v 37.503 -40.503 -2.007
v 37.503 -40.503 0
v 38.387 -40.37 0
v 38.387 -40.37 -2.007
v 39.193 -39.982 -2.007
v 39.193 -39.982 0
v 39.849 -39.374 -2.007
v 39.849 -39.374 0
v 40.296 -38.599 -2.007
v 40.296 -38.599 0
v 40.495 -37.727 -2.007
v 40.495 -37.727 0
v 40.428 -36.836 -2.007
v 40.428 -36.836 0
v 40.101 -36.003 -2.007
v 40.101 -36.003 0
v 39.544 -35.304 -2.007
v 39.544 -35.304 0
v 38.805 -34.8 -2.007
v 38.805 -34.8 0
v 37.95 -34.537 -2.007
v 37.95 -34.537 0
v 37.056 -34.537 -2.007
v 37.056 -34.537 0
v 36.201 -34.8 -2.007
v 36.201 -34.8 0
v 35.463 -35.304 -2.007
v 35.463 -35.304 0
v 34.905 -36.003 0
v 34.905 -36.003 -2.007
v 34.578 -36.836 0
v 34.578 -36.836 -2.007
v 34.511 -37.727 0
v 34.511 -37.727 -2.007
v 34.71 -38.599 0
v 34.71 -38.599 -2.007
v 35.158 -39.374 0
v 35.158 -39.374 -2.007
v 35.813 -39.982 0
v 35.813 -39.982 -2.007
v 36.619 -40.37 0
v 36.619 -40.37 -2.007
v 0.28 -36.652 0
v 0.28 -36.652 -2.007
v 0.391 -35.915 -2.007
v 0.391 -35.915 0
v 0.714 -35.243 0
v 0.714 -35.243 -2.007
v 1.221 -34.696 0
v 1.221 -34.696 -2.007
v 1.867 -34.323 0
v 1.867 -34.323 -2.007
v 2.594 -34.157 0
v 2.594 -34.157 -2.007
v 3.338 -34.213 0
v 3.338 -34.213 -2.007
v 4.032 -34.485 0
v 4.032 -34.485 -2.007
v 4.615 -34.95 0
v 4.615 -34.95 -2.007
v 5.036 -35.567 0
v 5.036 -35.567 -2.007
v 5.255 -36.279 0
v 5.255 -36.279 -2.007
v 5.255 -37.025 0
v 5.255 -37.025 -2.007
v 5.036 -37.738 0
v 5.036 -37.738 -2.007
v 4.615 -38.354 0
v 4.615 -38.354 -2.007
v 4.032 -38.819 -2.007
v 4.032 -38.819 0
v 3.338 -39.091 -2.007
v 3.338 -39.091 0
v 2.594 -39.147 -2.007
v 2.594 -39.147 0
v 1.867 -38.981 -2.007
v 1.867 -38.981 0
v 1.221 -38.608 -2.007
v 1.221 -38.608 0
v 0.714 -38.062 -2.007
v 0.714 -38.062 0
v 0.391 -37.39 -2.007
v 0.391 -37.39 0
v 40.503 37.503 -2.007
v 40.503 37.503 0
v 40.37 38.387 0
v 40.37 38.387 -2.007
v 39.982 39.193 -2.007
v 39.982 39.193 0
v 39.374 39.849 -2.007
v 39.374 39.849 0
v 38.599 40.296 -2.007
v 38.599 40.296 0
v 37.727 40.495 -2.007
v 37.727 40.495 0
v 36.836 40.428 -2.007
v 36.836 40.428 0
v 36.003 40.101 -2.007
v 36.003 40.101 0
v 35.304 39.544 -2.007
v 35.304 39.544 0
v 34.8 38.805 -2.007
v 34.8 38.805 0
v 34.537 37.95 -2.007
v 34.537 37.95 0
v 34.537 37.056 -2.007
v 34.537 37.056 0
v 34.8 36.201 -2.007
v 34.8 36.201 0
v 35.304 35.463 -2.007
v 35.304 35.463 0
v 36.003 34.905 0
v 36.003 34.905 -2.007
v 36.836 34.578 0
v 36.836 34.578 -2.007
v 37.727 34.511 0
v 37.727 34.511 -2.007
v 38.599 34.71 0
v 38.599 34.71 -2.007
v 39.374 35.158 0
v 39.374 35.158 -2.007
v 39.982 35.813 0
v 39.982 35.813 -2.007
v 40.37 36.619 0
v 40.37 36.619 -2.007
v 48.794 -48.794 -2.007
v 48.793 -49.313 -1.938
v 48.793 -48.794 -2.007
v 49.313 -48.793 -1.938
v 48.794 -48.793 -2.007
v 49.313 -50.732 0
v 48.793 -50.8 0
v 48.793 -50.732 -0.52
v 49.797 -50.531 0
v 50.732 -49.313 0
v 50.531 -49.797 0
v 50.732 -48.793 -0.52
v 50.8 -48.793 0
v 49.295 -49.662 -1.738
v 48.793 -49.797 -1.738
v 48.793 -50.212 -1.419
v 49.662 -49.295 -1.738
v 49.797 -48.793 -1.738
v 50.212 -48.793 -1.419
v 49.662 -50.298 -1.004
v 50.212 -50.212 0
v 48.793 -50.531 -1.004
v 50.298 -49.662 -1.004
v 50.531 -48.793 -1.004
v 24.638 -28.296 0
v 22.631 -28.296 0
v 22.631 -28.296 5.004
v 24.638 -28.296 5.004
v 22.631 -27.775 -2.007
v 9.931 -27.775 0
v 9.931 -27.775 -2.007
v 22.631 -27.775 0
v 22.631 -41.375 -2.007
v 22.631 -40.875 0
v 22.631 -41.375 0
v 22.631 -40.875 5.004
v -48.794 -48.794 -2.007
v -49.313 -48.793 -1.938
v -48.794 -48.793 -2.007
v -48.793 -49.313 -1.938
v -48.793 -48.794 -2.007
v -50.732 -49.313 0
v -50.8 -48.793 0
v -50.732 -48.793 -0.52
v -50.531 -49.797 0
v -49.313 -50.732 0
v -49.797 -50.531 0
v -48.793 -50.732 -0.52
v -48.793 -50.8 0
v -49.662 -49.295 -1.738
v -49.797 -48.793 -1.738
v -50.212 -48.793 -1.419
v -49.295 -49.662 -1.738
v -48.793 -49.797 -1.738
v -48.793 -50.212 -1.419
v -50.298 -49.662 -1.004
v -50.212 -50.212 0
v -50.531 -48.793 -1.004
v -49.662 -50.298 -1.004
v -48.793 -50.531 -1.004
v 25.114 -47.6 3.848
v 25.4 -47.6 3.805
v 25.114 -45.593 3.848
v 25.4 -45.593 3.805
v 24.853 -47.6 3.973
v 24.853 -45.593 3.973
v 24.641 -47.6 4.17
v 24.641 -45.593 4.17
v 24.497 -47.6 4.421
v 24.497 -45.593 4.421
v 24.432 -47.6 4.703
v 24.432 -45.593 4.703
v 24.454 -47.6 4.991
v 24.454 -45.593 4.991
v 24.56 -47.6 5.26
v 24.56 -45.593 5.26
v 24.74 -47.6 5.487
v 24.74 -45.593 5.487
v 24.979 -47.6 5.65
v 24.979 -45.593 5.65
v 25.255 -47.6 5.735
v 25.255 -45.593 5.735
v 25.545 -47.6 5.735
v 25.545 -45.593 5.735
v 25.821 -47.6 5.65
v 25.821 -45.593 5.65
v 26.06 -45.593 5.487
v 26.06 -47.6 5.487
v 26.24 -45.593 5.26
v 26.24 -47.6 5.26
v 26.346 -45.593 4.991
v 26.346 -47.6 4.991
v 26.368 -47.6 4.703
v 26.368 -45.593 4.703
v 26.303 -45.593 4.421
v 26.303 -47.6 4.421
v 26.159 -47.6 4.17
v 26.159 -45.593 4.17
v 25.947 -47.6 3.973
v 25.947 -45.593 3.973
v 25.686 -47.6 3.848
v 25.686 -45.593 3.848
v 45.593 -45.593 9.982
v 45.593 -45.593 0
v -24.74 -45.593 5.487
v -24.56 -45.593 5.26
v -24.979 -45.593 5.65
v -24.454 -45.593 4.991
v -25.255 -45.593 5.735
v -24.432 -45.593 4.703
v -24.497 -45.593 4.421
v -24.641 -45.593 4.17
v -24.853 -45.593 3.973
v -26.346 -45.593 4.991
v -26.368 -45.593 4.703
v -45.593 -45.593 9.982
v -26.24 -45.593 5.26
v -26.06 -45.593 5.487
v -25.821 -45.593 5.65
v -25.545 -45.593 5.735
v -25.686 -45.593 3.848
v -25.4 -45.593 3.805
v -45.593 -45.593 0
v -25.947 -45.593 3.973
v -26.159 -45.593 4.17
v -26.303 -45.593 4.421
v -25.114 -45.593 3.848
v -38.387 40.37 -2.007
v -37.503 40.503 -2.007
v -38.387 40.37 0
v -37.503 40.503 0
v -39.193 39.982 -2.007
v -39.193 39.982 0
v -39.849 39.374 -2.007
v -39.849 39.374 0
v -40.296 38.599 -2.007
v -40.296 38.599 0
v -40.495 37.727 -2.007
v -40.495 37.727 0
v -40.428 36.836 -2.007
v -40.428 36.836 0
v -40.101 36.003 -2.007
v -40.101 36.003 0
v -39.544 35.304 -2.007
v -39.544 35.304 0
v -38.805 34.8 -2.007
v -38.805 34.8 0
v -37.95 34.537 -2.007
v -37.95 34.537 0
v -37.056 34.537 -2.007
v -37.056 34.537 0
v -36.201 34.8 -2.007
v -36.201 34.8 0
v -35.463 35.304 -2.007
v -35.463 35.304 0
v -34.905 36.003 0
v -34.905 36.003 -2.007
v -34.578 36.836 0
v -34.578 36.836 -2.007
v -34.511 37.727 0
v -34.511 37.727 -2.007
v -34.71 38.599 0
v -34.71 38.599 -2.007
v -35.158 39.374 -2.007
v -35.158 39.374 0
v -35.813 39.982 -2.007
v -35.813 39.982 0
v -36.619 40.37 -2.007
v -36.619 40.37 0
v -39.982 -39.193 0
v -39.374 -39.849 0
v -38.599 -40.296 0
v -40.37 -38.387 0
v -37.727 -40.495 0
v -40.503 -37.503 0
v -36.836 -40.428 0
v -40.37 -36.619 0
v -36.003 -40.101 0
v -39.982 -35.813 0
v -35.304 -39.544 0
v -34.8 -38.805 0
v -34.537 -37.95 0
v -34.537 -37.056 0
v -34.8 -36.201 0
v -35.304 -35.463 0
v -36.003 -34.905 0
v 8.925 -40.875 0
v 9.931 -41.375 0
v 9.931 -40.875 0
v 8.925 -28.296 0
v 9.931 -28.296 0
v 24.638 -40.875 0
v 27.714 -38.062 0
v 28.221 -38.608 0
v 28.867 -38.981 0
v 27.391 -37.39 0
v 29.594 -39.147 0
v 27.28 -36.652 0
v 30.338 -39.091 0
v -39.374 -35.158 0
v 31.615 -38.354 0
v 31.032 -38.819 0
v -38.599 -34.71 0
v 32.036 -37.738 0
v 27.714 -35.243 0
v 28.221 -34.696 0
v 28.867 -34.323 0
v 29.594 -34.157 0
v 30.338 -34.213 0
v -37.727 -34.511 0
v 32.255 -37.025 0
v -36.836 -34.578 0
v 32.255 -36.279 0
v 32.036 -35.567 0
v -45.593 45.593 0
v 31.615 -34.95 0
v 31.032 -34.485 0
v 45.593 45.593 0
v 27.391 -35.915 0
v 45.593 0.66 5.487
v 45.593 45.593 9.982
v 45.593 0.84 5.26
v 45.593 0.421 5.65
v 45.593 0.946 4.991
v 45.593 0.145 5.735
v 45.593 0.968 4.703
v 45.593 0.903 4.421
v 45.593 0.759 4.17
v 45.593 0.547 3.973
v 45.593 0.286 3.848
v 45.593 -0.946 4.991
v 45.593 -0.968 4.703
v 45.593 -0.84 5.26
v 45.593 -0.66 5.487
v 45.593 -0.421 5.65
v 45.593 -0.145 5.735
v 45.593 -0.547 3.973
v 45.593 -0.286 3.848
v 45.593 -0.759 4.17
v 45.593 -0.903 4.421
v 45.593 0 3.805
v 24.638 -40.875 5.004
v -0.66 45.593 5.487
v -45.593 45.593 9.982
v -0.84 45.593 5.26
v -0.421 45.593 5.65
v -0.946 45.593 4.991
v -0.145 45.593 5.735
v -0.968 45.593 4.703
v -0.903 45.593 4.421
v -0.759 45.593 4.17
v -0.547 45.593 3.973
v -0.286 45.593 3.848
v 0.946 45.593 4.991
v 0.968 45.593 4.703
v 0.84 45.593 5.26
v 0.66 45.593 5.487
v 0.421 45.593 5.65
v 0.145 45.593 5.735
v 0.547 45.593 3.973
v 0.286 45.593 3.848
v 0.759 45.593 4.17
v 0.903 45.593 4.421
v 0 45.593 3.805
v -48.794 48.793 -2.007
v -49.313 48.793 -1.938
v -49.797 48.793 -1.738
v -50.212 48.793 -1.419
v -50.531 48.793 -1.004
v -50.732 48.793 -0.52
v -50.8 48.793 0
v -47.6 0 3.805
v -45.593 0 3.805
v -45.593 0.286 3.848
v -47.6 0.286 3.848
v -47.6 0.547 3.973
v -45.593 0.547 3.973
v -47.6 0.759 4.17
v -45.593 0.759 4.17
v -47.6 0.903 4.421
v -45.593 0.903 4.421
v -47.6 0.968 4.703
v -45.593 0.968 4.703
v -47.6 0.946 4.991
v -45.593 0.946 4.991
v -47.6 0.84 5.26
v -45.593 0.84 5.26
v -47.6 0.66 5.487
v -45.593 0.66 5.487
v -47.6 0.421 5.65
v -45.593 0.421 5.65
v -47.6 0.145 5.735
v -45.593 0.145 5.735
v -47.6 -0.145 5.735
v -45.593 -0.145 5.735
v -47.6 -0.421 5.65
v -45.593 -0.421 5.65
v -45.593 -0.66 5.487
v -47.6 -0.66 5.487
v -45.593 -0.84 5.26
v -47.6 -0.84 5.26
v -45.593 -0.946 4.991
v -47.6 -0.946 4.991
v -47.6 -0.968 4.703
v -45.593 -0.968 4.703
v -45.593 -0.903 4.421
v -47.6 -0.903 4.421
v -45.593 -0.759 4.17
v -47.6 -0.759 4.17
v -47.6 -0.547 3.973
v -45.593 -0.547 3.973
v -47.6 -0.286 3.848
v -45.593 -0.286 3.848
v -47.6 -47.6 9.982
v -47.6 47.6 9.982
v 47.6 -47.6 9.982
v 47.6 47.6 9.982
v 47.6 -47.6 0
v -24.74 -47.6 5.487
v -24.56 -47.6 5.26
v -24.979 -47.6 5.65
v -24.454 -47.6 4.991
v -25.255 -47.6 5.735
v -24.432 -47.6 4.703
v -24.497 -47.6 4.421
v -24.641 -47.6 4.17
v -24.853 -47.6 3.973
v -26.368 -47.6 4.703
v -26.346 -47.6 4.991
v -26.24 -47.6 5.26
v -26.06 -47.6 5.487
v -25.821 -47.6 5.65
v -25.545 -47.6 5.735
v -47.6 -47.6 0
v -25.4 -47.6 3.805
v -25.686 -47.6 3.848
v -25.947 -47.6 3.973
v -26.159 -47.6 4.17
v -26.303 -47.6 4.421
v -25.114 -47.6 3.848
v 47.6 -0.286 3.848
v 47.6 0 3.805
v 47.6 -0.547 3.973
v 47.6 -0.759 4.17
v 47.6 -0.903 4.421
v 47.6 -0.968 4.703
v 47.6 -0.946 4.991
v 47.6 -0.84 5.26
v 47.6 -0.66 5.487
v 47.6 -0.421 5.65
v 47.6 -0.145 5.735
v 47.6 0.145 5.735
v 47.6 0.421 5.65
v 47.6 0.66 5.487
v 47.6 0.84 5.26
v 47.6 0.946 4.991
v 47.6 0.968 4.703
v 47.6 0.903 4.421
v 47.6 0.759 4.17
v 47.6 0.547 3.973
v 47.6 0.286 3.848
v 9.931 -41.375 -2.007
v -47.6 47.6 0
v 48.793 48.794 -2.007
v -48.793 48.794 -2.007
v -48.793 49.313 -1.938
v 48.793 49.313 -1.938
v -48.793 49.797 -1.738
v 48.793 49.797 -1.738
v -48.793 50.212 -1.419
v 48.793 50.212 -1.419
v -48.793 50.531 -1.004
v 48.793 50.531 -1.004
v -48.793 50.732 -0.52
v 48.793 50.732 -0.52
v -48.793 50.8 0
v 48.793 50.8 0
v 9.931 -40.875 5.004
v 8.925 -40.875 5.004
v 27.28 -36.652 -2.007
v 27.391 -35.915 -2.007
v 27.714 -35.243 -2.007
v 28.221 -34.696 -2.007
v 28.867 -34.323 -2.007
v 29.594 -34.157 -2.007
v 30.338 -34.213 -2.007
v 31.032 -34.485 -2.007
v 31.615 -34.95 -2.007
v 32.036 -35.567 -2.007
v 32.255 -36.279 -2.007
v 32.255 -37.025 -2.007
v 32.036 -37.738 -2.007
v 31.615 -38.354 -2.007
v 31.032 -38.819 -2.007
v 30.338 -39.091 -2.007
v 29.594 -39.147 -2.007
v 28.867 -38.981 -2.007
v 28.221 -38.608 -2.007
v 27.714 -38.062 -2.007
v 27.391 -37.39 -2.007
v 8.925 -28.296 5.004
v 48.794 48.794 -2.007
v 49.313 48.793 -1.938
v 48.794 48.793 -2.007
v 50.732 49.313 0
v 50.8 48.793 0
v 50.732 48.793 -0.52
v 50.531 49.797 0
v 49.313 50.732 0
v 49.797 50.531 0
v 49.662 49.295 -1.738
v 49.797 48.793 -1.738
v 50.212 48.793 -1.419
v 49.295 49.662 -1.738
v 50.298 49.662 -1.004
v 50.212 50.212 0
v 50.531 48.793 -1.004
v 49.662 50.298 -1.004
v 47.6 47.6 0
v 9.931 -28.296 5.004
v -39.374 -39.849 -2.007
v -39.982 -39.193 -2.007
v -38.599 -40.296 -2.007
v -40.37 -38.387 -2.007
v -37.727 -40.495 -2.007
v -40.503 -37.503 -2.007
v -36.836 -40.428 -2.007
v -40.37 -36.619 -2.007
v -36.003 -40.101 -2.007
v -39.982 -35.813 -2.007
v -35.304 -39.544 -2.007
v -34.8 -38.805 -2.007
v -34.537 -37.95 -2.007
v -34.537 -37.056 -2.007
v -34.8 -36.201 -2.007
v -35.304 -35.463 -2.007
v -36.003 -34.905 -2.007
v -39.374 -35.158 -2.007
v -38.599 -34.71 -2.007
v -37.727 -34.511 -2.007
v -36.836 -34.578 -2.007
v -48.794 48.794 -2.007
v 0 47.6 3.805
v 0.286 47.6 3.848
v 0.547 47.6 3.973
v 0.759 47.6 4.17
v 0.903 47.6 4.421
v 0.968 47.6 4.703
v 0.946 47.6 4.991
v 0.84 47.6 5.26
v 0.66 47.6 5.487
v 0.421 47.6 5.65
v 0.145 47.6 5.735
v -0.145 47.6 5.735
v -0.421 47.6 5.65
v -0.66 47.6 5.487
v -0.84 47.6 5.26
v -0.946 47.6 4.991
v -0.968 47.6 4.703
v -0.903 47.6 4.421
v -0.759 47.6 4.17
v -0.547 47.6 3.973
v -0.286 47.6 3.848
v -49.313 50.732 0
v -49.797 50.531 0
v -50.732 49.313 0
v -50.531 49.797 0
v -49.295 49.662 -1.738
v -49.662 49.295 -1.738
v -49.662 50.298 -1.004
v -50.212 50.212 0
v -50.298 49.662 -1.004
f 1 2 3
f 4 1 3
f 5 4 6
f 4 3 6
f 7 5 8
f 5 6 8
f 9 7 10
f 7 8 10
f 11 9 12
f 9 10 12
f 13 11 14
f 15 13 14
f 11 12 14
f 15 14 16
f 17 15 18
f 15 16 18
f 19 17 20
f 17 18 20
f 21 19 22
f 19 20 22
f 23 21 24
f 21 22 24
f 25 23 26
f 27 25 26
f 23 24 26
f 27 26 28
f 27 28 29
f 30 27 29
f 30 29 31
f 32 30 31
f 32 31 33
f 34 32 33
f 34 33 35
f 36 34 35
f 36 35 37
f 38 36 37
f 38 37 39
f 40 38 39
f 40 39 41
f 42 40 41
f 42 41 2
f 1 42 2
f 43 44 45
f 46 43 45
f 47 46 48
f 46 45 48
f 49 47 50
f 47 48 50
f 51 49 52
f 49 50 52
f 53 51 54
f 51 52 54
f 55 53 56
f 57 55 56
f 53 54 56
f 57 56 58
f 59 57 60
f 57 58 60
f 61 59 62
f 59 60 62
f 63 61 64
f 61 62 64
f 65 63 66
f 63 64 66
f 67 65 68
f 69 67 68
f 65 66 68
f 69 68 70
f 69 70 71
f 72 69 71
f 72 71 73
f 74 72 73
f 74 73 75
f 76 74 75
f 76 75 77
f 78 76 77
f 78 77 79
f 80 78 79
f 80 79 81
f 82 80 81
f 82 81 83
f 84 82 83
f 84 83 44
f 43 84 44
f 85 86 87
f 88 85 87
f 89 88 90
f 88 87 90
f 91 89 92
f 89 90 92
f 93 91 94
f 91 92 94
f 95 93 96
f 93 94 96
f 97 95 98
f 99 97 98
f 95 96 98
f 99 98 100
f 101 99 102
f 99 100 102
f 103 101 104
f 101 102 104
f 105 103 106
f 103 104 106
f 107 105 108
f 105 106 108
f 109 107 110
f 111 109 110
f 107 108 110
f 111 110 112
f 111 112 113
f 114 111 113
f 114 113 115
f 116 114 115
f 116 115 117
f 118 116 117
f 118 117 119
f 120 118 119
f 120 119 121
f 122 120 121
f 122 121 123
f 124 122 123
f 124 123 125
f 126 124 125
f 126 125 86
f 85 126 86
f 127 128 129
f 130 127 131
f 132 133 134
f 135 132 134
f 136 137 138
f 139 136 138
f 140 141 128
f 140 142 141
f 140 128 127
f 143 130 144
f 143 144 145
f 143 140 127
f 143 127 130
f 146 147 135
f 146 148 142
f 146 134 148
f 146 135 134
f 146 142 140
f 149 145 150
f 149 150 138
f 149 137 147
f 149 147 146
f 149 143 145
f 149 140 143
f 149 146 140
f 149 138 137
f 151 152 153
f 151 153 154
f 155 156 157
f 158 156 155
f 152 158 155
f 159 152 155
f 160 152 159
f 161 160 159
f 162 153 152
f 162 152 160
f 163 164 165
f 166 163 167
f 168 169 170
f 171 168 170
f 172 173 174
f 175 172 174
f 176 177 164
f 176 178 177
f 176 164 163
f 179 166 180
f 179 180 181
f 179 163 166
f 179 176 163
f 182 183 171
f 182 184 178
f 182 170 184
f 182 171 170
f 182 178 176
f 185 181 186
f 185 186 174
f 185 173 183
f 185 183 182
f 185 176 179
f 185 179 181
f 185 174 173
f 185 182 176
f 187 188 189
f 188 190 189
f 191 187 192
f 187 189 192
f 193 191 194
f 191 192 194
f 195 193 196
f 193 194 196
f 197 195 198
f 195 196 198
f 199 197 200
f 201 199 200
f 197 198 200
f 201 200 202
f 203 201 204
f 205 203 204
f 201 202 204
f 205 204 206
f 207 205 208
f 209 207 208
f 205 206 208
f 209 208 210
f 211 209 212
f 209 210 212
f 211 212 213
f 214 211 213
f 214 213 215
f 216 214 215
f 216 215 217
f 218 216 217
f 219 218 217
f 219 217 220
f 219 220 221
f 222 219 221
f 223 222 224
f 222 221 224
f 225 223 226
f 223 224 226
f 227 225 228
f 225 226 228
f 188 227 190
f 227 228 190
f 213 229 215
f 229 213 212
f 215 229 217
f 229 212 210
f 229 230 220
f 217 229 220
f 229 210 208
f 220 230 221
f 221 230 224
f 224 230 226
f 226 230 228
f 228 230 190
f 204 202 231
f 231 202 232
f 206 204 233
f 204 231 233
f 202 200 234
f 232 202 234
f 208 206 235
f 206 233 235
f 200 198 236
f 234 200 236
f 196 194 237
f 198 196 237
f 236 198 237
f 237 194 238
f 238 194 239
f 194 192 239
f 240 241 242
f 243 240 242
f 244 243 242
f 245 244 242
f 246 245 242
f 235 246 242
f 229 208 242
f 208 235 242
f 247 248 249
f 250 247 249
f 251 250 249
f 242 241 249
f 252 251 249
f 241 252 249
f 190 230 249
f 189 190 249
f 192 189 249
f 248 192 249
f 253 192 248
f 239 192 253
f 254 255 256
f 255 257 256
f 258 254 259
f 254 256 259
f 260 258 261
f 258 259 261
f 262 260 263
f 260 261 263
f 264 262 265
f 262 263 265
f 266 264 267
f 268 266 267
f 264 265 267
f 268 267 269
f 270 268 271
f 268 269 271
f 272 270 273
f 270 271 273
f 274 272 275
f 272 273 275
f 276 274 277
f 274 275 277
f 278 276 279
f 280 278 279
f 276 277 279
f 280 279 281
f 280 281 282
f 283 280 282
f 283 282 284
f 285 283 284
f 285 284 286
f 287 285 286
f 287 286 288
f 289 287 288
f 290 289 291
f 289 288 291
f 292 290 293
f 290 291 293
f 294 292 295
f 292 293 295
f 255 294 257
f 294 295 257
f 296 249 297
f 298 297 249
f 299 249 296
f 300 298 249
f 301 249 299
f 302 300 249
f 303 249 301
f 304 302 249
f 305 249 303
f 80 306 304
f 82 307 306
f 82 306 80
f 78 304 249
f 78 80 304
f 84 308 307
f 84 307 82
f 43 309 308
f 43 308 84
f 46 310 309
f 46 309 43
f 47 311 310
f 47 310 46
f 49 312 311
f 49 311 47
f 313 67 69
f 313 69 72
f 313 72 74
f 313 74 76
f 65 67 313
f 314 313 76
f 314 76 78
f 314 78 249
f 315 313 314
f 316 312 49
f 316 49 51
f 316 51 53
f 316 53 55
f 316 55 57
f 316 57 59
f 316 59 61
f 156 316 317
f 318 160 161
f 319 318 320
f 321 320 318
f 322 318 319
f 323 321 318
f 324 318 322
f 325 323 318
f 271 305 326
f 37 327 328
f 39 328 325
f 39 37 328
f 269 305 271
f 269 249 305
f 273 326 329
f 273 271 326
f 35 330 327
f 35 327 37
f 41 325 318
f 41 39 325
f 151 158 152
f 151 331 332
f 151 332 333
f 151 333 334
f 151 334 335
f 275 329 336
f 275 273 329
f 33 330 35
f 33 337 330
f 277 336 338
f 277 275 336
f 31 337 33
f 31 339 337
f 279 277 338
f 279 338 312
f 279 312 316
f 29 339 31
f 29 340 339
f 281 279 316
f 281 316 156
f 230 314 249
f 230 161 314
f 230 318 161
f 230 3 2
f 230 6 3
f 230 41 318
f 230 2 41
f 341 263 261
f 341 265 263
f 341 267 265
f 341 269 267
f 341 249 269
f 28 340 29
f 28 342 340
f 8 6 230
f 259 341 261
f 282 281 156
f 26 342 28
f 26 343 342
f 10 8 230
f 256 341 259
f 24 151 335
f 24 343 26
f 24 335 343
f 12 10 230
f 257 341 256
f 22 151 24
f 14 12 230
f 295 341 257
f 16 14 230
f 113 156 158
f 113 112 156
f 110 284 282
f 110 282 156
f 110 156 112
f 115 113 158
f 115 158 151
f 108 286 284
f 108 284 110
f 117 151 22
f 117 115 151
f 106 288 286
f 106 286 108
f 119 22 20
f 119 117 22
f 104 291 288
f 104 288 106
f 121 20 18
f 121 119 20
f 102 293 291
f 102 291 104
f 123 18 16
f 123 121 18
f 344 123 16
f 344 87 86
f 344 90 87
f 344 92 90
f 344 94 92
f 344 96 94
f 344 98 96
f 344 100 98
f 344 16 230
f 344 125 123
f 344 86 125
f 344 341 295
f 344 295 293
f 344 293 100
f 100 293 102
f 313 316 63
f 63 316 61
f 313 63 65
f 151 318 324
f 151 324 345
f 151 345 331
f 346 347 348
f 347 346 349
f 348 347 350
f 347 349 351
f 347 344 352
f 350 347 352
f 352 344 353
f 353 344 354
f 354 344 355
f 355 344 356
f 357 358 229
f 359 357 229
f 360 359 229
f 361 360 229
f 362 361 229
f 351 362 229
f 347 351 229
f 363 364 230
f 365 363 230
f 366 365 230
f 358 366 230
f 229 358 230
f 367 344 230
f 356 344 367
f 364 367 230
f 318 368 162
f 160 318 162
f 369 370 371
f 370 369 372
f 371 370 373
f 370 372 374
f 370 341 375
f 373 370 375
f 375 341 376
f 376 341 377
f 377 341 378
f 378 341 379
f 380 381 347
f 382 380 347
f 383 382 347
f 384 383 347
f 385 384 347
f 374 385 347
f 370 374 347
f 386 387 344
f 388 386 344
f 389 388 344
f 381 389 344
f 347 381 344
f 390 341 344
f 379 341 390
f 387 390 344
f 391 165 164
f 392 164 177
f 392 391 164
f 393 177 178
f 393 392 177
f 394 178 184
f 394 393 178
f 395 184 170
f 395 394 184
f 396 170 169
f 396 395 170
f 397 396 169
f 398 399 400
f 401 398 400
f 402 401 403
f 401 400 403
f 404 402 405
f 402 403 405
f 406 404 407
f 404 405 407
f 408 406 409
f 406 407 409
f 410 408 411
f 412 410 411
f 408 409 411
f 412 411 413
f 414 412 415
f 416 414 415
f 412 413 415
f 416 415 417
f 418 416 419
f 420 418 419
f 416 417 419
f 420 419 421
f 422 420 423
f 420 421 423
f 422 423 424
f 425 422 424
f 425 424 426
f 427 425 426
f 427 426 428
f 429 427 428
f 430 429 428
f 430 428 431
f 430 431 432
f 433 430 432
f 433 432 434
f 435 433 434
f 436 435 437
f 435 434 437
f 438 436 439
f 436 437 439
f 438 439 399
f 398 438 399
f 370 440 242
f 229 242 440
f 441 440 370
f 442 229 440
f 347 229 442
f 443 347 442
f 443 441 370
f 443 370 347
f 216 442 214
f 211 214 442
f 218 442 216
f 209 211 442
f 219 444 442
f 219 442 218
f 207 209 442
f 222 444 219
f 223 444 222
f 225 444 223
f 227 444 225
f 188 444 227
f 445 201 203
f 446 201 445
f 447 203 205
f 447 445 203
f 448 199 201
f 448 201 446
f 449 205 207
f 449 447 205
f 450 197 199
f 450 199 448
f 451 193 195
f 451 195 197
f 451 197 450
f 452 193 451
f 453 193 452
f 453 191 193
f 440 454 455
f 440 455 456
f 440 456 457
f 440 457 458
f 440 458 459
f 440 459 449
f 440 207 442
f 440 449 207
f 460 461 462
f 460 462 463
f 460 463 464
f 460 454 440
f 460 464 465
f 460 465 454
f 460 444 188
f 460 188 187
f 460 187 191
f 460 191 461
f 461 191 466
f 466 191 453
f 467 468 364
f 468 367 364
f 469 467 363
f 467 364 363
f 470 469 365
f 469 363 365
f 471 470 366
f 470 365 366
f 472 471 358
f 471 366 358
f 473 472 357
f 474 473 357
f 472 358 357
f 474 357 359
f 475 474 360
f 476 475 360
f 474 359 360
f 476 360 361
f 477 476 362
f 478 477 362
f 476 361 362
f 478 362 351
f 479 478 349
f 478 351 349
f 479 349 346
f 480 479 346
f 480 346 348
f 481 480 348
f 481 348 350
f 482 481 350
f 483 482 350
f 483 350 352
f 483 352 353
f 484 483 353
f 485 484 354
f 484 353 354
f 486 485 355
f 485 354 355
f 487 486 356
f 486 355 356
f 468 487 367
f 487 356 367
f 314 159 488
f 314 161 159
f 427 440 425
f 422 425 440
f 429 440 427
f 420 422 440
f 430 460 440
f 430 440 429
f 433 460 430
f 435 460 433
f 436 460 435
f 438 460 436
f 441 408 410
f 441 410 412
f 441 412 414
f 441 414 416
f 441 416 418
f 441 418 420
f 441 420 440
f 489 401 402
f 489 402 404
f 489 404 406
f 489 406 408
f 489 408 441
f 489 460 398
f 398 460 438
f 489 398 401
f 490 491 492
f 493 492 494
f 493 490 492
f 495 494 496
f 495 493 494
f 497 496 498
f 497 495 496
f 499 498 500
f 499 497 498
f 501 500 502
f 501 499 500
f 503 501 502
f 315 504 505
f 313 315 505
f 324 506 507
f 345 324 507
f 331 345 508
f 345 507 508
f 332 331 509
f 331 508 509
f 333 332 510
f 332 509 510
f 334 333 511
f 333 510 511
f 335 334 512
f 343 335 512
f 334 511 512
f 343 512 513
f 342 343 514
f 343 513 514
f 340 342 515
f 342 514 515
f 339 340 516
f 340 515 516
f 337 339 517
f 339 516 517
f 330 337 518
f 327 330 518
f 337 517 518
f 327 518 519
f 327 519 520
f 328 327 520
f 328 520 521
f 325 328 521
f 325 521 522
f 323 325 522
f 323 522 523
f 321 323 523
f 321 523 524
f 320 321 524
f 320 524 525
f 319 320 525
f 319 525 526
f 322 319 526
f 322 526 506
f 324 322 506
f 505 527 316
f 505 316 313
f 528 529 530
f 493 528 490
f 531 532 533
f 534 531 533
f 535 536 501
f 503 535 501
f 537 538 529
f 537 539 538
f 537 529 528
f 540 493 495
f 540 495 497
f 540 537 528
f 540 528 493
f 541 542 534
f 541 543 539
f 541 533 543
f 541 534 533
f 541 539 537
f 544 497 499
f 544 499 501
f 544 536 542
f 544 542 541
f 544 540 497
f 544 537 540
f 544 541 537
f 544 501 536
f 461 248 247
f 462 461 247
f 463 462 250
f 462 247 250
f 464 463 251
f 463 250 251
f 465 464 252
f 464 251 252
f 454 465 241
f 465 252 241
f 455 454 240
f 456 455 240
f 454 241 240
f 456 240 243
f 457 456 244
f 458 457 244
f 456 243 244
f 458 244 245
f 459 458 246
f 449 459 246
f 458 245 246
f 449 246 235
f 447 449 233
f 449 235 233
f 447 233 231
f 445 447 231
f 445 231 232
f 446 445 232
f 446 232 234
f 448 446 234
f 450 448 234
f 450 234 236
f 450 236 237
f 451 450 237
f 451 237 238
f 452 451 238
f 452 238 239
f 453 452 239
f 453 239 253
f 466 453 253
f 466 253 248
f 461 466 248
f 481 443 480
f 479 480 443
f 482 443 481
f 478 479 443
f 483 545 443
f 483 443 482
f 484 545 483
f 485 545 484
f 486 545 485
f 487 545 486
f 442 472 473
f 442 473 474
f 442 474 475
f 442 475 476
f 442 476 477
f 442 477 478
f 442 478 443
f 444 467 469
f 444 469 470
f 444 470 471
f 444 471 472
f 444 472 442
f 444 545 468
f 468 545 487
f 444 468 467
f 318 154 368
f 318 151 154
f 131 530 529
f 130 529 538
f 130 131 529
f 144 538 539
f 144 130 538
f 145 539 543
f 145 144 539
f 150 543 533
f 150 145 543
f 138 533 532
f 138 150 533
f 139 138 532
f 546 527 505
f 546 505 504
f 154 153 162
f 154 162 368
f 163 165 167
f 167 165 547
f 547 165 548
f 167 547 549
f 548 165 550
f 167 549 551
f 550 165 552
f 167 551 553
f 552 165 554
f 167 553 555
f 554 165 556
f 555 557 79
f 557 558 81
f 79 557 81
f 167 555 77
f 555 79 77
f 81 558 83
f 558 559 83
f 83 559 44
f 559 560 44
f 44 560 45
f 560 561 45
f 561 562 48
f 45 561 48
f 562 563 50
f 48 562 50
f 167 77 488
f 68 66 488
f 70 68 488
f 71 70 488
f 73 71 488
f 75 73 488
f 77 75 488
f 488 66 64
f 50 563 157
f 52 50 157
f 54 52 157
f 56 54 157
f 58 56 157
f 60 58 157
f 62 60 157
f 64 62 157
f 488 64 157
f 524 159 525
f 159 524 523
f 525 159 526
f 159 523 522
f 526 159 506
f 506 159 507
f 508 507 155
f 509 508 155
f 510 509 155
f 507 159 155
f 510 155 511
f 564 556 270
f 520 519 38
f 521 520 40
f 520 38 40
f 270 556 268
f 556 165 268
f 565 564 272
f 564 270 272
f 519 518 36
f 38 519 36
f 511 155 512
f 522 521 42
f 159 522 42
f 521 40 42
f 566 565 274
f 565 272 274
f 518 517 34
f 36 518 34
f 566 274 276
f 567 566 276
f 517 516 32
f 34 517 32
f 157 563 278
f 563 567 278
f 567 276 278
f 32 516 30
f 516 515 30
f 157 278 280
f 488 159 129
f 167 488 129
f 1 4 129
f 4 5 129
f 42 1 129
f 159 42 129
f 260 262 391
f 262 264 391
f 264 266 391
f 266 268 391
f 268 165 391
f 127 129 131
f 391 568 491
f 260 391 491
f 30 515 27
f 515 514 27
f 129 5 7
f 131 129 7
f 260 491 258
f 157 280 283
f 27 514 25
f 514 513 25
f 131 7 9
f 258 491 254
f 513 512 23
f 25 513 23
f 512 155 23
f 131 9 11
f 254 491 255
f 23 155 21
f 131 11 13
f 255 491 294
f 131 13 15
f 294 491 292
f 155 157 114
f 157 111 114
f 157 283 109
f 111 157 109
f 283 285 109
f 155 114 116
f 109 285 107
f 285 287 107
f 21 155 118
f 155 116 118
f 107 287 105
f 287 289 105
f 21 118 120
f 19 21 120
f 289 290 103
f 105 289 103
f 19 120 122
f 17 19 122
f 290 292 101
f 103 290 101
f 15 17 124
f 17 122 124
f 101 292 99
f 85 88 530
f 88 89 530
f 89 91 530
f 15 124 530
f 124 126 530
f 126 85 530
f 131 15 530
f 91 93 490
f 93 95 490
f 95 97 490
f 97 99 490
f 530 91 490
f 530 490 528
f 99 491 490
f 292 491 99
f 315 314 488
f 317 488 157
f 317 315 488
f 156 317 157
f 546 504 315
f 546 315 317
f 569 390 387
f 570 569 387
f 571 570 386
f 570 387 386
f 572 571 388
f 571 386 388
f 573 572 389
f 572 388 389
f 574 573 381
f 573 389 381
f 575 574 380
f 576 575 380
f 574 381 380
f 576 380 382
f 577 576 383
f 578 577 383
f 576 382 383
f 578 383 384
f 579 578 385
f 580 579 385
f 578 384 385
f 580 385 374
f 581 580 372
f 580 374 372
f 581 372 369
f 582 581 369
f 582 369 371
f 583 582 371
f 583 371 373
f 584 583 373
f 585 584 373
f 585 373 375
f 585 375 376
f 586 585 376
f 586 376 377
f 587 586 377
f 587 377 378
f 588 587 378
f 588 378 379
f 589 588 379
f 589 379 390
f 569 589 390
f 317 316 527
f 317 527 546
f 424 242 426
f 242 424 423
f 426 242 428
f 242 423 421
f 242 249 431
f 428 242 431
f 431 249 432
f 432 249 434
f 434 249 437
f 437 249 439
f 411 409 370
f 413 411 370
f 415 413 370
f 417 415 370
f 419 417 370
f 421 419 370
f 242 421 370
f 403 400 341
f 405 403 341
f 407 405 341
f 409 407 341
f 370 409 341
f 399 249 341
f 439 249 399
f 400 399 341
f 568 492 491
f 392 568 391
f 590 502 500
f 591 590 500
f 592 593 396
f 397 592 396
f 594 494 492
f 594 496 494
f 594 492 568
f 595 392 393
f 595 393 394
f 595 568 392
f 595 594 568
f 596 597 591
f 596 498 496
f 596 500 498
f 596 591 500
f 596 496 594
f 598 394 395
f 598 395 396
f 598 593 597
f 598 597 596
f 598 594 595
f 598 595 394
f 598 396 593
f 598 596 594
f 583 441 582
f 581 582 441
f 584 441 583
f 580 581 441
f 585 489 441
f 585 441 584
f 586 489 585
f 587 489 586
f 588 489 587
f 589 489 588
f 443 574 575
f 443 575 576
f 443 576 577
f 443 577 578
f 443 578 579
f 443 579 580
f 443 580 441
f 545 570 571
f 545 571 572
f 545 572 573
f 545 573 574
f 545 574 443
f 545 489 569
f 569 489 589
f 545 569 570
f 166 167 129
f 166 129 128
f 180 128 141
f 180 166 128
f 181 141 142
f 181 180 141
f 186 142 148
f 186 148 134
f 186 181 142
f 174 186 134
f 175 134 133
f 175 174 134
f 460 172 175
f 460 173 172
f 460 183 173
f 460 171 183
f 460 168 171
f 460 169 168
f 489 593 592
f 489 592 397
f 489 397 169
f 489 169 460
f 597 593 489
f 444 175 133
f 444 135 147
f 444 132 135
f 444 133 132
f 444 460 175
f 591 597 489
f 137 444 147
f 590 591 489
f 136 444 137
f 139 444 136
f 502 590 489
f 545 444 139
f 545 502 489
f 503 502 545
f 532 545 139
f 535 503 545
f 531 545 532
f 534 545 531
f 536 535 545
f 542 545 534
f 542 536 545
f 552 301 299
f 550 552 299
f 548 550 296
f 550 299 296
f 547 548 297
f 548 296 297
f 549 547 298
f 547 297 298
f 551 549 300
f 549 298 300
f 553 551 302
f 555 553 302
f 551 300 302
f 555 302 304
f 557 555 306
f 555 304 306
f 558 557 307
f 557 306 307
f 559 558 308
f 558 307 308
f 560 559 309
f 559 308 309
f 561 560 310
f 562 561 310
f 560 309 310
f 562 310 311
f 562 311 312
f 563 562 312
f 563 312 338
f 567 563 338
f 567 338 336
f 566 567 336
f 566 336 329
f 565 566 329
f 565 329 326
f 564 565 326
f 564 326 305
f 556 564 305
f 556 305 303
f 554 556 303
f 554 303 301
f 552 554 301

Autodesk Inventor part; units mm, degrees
ref_plane "YZ Plane" through (0, 0, 0) normal (1, 0, 0) x (0, 1, 0)
ref_plane "XZ Plane" through (0, 0, 0) normal (0, 1, 0) x (-1, 0, 0)
ref_plane "XY Plane" through (0, 0, 0) normal (0, 0, 1) x (1, 0, 0)
sketch "Skizze1" plane through (0, 0, 0) normal (0, 0, 1) x (1, 0, 0)
  line L0 (-50.8, 50.8) -> (50.8, 50.8)
  line L1 (50.8, 50.8) -> (50.8, -50.8)
  line L2 (50.8, -50.8) -> (-50.8, -50.8)
  line L3 (-50.8, -50.8) -> (-50.8, 50.8)
  line L4 (50.8, -50.8) -> (-50.8, 50.8) construction
  point P0 (0, 0)
  point P1 (0, 0)
  dimension "d0" = 101.6
  dimension "d1" = 101.6
extrude "Extrusion1" add sketch "Skizze1" against normal blind 2.0066
fillet "Rundung1" radius 2.0066 4 edges at (50.8, -50.8, -1.0033) (50.8, 50.8, -1.0033) (-50.8, 50.8, -1.0033) (-50.8, -50.8, -1.0033)
fillet "Rundung2" radius 2.0066 8 edges at (-50.2123, -50.2123, -2.0066) (-50.8, 0, -2.0066) (-50.2123, 50.2123, -2.0066) (0, 50.8, -2.0066) (50.2123, 50.2123, -2.0066) (50.8, 0, -2.0066) (50.2123, -50.2123, -2.0066) (0, -50.8, -2.0066)
sketch "Skizze2" plane through (0, 0, 0) normal (0, 0, 1) x (1, 0, 0)
  line L0 (-47.5996, 47.5996) -> (47.5996, 47.5996)
  line L1 (47.5996, 47.5996) -> (47.5996, -47.5996)
  line L2 (47.5996, -47.5996) -> (-47.5996, -47.5996)
  line L3 (-47.5996, -47.5996) -> (-47.5996, 47.5996)
  line L4 (47.5996, -47.5996) -> (-47.5996, 47.5996) construction
  line L5 (-45.593, 45.593) -> (45.593, 45.593)
  line L6 (45.593, 45.593) -> (45.593, -45.593)
  line L7 (45.593, -45.593) -> (-45.593, -45.593)
  line L8 (-45.593, -45.593) -> (-45.593, 45.593)
  line L9 (-45.593, -45.593) -> (45.593, 45.593) construction
  point P0 (0, 0)
  point P1 (0, 0)
  dimension "d6" = 95.1992
  dimension "d7" = 2.0066
extrude "Extrusion2" add sketch "Skizze2" along normal blind 9.9822
sketch "Skizze3" plane through (47.5996, -47.5996, 0) normal (1, 0, 0) x (0, 0, -1)
  line L0 (0, 95.1992) -> (0, 0) projected
  line L1 (0, 95.1992) -> (-9.9822, 95.1992) projected
  line L2 (-9.9822, 0) -> (-9.9822, 95.1992) projected
  line L3 (0, 0) -> (-9.9822, 0) projected
  line L4 (0, 47.5996) -> (-4.7752, 47.5996) construction
  line L5 (0, 95.1992) -> (0, 0) construction
  dimension "d10" = 4.7752
hole "Bohrung1" at (47.5996, 0, 4.7752) direction (-1, 0, 0) diameter 1.941 depth 7.675 tip angle 118 thread size "3-48 UNC" class "2B" standard "ANSI Unified Screw Threads"
pattern_circular "Runde Anordnung1" count 3 over 180 about axis through (0, 0, -10) along (0, 0, 1) of "Bohrung1"
sketch "Skizze4" plane through (-47.5996, -47.5996, 0) normal (0, -1, 0) x (1, 0, 0)
  line L0 (95.1992, 0) -> (0, 0) projected
  line L1 (95.1992, 0) -> (95.1992, 9.9822) projected
  line L2 (0, 9.9822) -> (95.1992, 9.9822) projected
  line L3 (0, 0) -> (0, 9.9822) projected
  line L4 (47.5996, 0) -> (47.5996, 4.7752) construction
  line L5 (22.1996, 4.7752) -> (72.9996, 4.7752) construction
  dimension "d21" = 4.7752
  dimension "d22" = 50.8
hole "Bohrung2" at (-25.4, -47.5996, 4.7752) at (25.4, -47.5996, 4.7752) direction (0, 1, 0) diameter 1.941 depth 7.675 tip angle 118 thread size "3-48 UNC" class "2B" standard "ANSI Unified Screw Threads"
sketch "Skizze5" plane through (0, 0, -2.0066) normal (0, 0, -1) x (-1, 0, 0)
  line L0 (37.5031, -37.5031) -> (-37.5031, -37.5031) construction
  line L1 (-37.5031, -37.5031) -> (-37.5031, 37.5031) construction
  line L2 (-37.5031, 37.5031) -> (37.5031, 37.5031) construction
  line L3 (37.5031, 37.5031) -> (37.5031, -37.5031) construction
  line L4 (-37.5031, 37.5031) -> (37.5031, -37.5031) construction
  point P0 (0, 0)
  point P1 (0, 0)
  dimension "d30" = 75.0062
hole "Bohrung3" at (-37.5031, 37.5031, -2.0066) direction (0, 0, 1) diameter 6 end through all
sketch "Skizze6" plane through (0, 0, 0) normal (0, 0, 1) x (1, 0, 0)
  circle A0 centre (-37.5031, 37.5031) radius 3 projected
  line L0 (-48.7934, 48.7934) -> (-48.7934, -48.7934) projected
  line L1 (48.7934, 48.7934) -> (-48.7934, 48.7934) projected
  line L2 (48.7934, -48.7934) -> (48.7934, 48.7934) projected
  line L3 (-48.7934, -48.7934) -> (48.7934, -48.7934) projected
  circle A1 centre (-37.5031, 37.5031) radius 3.45
  circle A2 centre (-37.5031, 37.5031) radius 1.4986
  point P0 (0, 0)
  dimension "d38" = 2.9972
  dimension "d39" = 6.9
extrude "Extrusion3" add sketch "Skizze6" along normal blind 5 contours A0 | A1
pattern_circular "Runde Anordnung2" count 4 over 360 about axis through (0, 0, -10) along (0, 0, 1) of "Bohrung3", "Extrusion3"
sketch "Skizze7" plane through (0, 0, 0) normal (0, 0, 1) x (1, 0, 0)
  circle A0 centre (37.5031, 37.5031) radius 3 projected
  circle A1 centre (37.5031, -37.5031) radius 3 projected
  circle A2 centre (-37.5031, -37.5031) radius 3 projected
  circle A3 centre (-37.5031, 37.5031) radius 3 projected
  line L0 (-48.7934, 48.7934) -> (-48.7934, -48.7934) projected
  line L1 (48.7934, 48.7934) -> (-48.7934, 48.7934) projected
  line L2 (48.7934, -48.7934) -> (48.7934, 48.7934) projected
  line L3 (-48.7934, -48.7934) -> (48.7934, -48.7934) projected
  line L4 (7.9248, -28.2956) -> (24.638, -28.2956)
  line L5 (24.638, -28.2956) -> (24.638, -44.2214)
  line L6 (24.638, -44.2214) -> (7.9248, -44.2214)
  line L7 (7.9248, -44.2214) -> (7.9248, -28.2956)
  line L8 (9.9314, -30.3022) -> (22.6314, -30.3022)
  line L9 (22.6314, -30.3022) -> (22.6314, -43.0022)
  line L10 (22.6314, -43.0022) -> (9.9314, -43.0022)
  line L11 (9.9314, -43.0022) -> (9.9314, -30.3022)
  line L12 (16.2814, -28.2956) -> (16.2814, -30.3022) construction
  circle A4 centre (2.7814, -36.6522) radius 1.4986
  circle A5 centre (2.7814, -36.6522) radius 3.4163
  circle A6 centre (29.7814, -36.6522) radius 1.4986
  circle A7 centre (29.7814, -36.6522) radius 3.4163
  line L13 (9.9314, -43.0022) -> (22.6314, -30.3022) construction
  line L14 (29.7814, -36.6522) -> (2.7814, -36.6522) construction
  line L15 (50.8, -48.7934) -> (48.7934, -48.7934) projected
  arc A8 (48.7934, -50.8) -> (50.8, -48.7934) centre (48.7934, -48.7934) ccw projected
  line L16 (48.7934, -48.7934) -> (48.7934, -50.8) projected
  line L17 (50.8, 48.7934) -> (50.8, -48.7934) projected
  line L18 (48.7934, -50.8) -> (-48.7934, -50.8) projected
  point P0 (0, 0)
  point P1 (16.2814, -36.6522)
  dimension "d46" = 12.7
  dimension "d49" = 1.2192
  dimension "d51" = 6.8326
  dimension "d52" = 27
  dimension "d53" = 2.9972
  dimension "d58" = 2.0066
  dimension "d59" = 2.0066
  dimension "d61" = 14.1478
  dimension "d70" = 28.1686
  dimension "d71" = 21.0186
  dimension "d72" = 27
extrude "Extrusion4" add sketch "Skizze7" along normal blind 5.0038 contours L4 L5 L6 L7 | A4 | A5 | A6 | A7
sketch "Skizze8" plane through (0, 0, -2.0066) normal (0, 0, -1) x (-1, 0, 0)
  circle A0 centre (-29.7814, -36.6522) radius 2.5019
  circle A1 centre (-2.7814, -36.6522) radius 2.5019
  circle A2 centre (-2.7814, -36.6522) radius 3.4163 projected
  circle A3 centre (-29.7814, -36.6522) radius 3.4163 projected
  point P0 (0, 0)
  dimension "d64" = 5.0038
extrude "Extrusion5" cut sketch "Skizze8" against normal blind 2.0066 contours A0 | A1
sketch "Skizze10" plane through (2.7814, -36.6522, 5.0038) normal (0, 0, 1) x (1, 0, 0)
  circle A0 centre (0, 0) radius 3.4163 projected
  circle A1 centre (27, 0) radius 3.4163 projected
  circle A2 centre (0, 0) radius 1.5875
  circle A3 centre (27, 0) radius 3.4163 projected
  circle A4 centre (27, 0) radius 1.5875
  point P0 (-2.7814, 36.6522)
  dimension "d67" = 3.175
extrude "Extrusion6" cut sketch "Skizze10" against normal blind 3.4798 contours A2 | A4
sketch "Skizze12" plane through (0, 0, 9.9822) normal (0, 0, 1) x (1, 0, 0)
  line L0 (45.593, -45.593) -> (45.593, 45.593) construction
  line L1 (45.593, 45.593) -> (-45.593, 45.593) construction
  line L2 (-45.593, 45.593) -> (-45.593, -45.593) construction
  line L3 (-45.593, -45.593) -> (45.593, -45.593) construction
  circle A0 centre (-37.5031, 37.5031) radius 3.45 construction
  circle A1 centre (-37.5031, -37.5031) radius 3.45 construction
  circle A2 centre (37.5031, -37.5031) radius 3.45 construction
  circle A3 centre (37.5031, 37.5031) radius 3.45 construction
  circle A4 centre (29.7814, -36.6522) radius 3.4163 construction
  circle A5 centre (2.7814, -36.6522) radius 3.4163 construction
  line L4 (24.638, -28.2956) -> (24.638, -44.2214) construction
  line L5 (24.638, -44.2214) -> (7.9248, -44.2214) construction
  line L6 (7.9248, -44.2214) -> (7.9248, -28.2956) construction
  line L7 (7.9248, -28.2956) -> (24.638, -28.2956) construction
  line L8 (-47.625, 47.625) -> (47.625, 47.625) construction
  line L9 (47.625, 47.625) -> (47.625, -47.625) construction
  line L10 (47.625, -47.625) -> (-47.625, -47.625) construction
  line L11 (-47.625, -47.625) -> (-47.625, 47.625) construction
  line L12 (47.625, -47.625) -> (-47.625, 47.625) construction
  line L13 (45.593, -45.593) -> (-45.593, -45.593) construction
  line L14 (-45.593, 45.593) -> (45.593, 45.593) construction
  line L15 (-45.593, -45.593) -> (45.593, 45.593) construction
  line L16 (9.9314, -27.775) -> (22.6314, -27.775)
  line L17 (22.6314, -27.775) -> (22.6314, -41.375)
  line L18 (22.6314, -41.375) -> (9.9314, -41.375)
  line L19 (9.9314, -41.375) -> (9.9314, -27.775)
  line L20 (22.6314, -30.3022) -> (22.6314, -43.0022) projected
  line L21 (9.9314, -43.0022) -> (9.9314, -30.3022) projected
  circle A6 centre (37.5031, 37.5031) radius 1.4986 projected
  circle A7 centre (37.5031, 37.5031) radius 3.45
  circle A8 centre (37.5031, -37.5031) radius 1.4986 projected
  circle A9 centre (37.5031, -37.5031) radius 3.45
  circle A10 centre (29.7814, -36.6522) radius 1.5875 projected
  circle A11 centre (29.7814, -36.6522) radius 3.4163
  line L22 (7.9248, -28.2956) -> (7.9248, -44.2214) projected
  line L23 (24.638, -28.2956) -> (24.638, -44.2214) projected
  line L24 (7.9248, -44.2214) -> (24.638, -44.2214)
  line L25 (24.638, -44.2214) -> (24.638, -40.875)
  line L26 (24.638, -40.875) -> (7.9248, -40.875)
  line L27 (7.9248, -40.875) -> (7.9248, -44.2214)
  line L28 (7.9248, -28.2956) -> (8.9248, -28.2956)
  line L29 (8.9248, -28.2956) -> (8.9248, -40.875)
  line L30 (8.9248, -40.875) -> (7.9248, -40.875)
  line L31 (7.9248, -40.875) -> (7.9248, -28.2956)
  circle A12 centre (2.7814, -36.6522) radius 1.5875 projected
  circle A13 centre (2.7814, -36.6522) radius 3.4163
  circle A14 centre (-37.5031, -37.5031) radius 3 projected
  circle A15 centre (-37.5031, -37.5031) radius 3.45
  circle A16 centre (-37.5031, 37.5031) radius 1.4986 projected
  circle A17 centre (-37.5031, 37.5031) radius 3.45
  point P0 (0, 0)
  point P1 (0, 0)
  point P2 (16.2814, -41.375)
  dimension "d76" = 95.25
  dimension "d77" = 12.7
  dimension "d78" = 13.6
  dimension "d79" = 6.25
  dimension "d80" = 63.9064
  dimension "d84" = 1
  dimension "d87" = 2.8464
  dimension "d88" = 3.3464
extrude "Extrusion7" cut sketch "Skizze12" against normal through all contours L16 L17 L26 L19 | L26 L17 L18 L19
extrude "Extrusion8" cut sketch "Skizze12" against normal up to surface (9.9822 mm away) contours L26 L17 L18 L19 | L19 L18 L17 L26 L23 L24 L22 | L26 L22 L28 L29 | A7 | A9 | A10 | A11 | A12 | A13 | A14 | A15 | A17
equation "\"d59\" = d58"
properties part number "Nanolab CubeDeckel 2"
